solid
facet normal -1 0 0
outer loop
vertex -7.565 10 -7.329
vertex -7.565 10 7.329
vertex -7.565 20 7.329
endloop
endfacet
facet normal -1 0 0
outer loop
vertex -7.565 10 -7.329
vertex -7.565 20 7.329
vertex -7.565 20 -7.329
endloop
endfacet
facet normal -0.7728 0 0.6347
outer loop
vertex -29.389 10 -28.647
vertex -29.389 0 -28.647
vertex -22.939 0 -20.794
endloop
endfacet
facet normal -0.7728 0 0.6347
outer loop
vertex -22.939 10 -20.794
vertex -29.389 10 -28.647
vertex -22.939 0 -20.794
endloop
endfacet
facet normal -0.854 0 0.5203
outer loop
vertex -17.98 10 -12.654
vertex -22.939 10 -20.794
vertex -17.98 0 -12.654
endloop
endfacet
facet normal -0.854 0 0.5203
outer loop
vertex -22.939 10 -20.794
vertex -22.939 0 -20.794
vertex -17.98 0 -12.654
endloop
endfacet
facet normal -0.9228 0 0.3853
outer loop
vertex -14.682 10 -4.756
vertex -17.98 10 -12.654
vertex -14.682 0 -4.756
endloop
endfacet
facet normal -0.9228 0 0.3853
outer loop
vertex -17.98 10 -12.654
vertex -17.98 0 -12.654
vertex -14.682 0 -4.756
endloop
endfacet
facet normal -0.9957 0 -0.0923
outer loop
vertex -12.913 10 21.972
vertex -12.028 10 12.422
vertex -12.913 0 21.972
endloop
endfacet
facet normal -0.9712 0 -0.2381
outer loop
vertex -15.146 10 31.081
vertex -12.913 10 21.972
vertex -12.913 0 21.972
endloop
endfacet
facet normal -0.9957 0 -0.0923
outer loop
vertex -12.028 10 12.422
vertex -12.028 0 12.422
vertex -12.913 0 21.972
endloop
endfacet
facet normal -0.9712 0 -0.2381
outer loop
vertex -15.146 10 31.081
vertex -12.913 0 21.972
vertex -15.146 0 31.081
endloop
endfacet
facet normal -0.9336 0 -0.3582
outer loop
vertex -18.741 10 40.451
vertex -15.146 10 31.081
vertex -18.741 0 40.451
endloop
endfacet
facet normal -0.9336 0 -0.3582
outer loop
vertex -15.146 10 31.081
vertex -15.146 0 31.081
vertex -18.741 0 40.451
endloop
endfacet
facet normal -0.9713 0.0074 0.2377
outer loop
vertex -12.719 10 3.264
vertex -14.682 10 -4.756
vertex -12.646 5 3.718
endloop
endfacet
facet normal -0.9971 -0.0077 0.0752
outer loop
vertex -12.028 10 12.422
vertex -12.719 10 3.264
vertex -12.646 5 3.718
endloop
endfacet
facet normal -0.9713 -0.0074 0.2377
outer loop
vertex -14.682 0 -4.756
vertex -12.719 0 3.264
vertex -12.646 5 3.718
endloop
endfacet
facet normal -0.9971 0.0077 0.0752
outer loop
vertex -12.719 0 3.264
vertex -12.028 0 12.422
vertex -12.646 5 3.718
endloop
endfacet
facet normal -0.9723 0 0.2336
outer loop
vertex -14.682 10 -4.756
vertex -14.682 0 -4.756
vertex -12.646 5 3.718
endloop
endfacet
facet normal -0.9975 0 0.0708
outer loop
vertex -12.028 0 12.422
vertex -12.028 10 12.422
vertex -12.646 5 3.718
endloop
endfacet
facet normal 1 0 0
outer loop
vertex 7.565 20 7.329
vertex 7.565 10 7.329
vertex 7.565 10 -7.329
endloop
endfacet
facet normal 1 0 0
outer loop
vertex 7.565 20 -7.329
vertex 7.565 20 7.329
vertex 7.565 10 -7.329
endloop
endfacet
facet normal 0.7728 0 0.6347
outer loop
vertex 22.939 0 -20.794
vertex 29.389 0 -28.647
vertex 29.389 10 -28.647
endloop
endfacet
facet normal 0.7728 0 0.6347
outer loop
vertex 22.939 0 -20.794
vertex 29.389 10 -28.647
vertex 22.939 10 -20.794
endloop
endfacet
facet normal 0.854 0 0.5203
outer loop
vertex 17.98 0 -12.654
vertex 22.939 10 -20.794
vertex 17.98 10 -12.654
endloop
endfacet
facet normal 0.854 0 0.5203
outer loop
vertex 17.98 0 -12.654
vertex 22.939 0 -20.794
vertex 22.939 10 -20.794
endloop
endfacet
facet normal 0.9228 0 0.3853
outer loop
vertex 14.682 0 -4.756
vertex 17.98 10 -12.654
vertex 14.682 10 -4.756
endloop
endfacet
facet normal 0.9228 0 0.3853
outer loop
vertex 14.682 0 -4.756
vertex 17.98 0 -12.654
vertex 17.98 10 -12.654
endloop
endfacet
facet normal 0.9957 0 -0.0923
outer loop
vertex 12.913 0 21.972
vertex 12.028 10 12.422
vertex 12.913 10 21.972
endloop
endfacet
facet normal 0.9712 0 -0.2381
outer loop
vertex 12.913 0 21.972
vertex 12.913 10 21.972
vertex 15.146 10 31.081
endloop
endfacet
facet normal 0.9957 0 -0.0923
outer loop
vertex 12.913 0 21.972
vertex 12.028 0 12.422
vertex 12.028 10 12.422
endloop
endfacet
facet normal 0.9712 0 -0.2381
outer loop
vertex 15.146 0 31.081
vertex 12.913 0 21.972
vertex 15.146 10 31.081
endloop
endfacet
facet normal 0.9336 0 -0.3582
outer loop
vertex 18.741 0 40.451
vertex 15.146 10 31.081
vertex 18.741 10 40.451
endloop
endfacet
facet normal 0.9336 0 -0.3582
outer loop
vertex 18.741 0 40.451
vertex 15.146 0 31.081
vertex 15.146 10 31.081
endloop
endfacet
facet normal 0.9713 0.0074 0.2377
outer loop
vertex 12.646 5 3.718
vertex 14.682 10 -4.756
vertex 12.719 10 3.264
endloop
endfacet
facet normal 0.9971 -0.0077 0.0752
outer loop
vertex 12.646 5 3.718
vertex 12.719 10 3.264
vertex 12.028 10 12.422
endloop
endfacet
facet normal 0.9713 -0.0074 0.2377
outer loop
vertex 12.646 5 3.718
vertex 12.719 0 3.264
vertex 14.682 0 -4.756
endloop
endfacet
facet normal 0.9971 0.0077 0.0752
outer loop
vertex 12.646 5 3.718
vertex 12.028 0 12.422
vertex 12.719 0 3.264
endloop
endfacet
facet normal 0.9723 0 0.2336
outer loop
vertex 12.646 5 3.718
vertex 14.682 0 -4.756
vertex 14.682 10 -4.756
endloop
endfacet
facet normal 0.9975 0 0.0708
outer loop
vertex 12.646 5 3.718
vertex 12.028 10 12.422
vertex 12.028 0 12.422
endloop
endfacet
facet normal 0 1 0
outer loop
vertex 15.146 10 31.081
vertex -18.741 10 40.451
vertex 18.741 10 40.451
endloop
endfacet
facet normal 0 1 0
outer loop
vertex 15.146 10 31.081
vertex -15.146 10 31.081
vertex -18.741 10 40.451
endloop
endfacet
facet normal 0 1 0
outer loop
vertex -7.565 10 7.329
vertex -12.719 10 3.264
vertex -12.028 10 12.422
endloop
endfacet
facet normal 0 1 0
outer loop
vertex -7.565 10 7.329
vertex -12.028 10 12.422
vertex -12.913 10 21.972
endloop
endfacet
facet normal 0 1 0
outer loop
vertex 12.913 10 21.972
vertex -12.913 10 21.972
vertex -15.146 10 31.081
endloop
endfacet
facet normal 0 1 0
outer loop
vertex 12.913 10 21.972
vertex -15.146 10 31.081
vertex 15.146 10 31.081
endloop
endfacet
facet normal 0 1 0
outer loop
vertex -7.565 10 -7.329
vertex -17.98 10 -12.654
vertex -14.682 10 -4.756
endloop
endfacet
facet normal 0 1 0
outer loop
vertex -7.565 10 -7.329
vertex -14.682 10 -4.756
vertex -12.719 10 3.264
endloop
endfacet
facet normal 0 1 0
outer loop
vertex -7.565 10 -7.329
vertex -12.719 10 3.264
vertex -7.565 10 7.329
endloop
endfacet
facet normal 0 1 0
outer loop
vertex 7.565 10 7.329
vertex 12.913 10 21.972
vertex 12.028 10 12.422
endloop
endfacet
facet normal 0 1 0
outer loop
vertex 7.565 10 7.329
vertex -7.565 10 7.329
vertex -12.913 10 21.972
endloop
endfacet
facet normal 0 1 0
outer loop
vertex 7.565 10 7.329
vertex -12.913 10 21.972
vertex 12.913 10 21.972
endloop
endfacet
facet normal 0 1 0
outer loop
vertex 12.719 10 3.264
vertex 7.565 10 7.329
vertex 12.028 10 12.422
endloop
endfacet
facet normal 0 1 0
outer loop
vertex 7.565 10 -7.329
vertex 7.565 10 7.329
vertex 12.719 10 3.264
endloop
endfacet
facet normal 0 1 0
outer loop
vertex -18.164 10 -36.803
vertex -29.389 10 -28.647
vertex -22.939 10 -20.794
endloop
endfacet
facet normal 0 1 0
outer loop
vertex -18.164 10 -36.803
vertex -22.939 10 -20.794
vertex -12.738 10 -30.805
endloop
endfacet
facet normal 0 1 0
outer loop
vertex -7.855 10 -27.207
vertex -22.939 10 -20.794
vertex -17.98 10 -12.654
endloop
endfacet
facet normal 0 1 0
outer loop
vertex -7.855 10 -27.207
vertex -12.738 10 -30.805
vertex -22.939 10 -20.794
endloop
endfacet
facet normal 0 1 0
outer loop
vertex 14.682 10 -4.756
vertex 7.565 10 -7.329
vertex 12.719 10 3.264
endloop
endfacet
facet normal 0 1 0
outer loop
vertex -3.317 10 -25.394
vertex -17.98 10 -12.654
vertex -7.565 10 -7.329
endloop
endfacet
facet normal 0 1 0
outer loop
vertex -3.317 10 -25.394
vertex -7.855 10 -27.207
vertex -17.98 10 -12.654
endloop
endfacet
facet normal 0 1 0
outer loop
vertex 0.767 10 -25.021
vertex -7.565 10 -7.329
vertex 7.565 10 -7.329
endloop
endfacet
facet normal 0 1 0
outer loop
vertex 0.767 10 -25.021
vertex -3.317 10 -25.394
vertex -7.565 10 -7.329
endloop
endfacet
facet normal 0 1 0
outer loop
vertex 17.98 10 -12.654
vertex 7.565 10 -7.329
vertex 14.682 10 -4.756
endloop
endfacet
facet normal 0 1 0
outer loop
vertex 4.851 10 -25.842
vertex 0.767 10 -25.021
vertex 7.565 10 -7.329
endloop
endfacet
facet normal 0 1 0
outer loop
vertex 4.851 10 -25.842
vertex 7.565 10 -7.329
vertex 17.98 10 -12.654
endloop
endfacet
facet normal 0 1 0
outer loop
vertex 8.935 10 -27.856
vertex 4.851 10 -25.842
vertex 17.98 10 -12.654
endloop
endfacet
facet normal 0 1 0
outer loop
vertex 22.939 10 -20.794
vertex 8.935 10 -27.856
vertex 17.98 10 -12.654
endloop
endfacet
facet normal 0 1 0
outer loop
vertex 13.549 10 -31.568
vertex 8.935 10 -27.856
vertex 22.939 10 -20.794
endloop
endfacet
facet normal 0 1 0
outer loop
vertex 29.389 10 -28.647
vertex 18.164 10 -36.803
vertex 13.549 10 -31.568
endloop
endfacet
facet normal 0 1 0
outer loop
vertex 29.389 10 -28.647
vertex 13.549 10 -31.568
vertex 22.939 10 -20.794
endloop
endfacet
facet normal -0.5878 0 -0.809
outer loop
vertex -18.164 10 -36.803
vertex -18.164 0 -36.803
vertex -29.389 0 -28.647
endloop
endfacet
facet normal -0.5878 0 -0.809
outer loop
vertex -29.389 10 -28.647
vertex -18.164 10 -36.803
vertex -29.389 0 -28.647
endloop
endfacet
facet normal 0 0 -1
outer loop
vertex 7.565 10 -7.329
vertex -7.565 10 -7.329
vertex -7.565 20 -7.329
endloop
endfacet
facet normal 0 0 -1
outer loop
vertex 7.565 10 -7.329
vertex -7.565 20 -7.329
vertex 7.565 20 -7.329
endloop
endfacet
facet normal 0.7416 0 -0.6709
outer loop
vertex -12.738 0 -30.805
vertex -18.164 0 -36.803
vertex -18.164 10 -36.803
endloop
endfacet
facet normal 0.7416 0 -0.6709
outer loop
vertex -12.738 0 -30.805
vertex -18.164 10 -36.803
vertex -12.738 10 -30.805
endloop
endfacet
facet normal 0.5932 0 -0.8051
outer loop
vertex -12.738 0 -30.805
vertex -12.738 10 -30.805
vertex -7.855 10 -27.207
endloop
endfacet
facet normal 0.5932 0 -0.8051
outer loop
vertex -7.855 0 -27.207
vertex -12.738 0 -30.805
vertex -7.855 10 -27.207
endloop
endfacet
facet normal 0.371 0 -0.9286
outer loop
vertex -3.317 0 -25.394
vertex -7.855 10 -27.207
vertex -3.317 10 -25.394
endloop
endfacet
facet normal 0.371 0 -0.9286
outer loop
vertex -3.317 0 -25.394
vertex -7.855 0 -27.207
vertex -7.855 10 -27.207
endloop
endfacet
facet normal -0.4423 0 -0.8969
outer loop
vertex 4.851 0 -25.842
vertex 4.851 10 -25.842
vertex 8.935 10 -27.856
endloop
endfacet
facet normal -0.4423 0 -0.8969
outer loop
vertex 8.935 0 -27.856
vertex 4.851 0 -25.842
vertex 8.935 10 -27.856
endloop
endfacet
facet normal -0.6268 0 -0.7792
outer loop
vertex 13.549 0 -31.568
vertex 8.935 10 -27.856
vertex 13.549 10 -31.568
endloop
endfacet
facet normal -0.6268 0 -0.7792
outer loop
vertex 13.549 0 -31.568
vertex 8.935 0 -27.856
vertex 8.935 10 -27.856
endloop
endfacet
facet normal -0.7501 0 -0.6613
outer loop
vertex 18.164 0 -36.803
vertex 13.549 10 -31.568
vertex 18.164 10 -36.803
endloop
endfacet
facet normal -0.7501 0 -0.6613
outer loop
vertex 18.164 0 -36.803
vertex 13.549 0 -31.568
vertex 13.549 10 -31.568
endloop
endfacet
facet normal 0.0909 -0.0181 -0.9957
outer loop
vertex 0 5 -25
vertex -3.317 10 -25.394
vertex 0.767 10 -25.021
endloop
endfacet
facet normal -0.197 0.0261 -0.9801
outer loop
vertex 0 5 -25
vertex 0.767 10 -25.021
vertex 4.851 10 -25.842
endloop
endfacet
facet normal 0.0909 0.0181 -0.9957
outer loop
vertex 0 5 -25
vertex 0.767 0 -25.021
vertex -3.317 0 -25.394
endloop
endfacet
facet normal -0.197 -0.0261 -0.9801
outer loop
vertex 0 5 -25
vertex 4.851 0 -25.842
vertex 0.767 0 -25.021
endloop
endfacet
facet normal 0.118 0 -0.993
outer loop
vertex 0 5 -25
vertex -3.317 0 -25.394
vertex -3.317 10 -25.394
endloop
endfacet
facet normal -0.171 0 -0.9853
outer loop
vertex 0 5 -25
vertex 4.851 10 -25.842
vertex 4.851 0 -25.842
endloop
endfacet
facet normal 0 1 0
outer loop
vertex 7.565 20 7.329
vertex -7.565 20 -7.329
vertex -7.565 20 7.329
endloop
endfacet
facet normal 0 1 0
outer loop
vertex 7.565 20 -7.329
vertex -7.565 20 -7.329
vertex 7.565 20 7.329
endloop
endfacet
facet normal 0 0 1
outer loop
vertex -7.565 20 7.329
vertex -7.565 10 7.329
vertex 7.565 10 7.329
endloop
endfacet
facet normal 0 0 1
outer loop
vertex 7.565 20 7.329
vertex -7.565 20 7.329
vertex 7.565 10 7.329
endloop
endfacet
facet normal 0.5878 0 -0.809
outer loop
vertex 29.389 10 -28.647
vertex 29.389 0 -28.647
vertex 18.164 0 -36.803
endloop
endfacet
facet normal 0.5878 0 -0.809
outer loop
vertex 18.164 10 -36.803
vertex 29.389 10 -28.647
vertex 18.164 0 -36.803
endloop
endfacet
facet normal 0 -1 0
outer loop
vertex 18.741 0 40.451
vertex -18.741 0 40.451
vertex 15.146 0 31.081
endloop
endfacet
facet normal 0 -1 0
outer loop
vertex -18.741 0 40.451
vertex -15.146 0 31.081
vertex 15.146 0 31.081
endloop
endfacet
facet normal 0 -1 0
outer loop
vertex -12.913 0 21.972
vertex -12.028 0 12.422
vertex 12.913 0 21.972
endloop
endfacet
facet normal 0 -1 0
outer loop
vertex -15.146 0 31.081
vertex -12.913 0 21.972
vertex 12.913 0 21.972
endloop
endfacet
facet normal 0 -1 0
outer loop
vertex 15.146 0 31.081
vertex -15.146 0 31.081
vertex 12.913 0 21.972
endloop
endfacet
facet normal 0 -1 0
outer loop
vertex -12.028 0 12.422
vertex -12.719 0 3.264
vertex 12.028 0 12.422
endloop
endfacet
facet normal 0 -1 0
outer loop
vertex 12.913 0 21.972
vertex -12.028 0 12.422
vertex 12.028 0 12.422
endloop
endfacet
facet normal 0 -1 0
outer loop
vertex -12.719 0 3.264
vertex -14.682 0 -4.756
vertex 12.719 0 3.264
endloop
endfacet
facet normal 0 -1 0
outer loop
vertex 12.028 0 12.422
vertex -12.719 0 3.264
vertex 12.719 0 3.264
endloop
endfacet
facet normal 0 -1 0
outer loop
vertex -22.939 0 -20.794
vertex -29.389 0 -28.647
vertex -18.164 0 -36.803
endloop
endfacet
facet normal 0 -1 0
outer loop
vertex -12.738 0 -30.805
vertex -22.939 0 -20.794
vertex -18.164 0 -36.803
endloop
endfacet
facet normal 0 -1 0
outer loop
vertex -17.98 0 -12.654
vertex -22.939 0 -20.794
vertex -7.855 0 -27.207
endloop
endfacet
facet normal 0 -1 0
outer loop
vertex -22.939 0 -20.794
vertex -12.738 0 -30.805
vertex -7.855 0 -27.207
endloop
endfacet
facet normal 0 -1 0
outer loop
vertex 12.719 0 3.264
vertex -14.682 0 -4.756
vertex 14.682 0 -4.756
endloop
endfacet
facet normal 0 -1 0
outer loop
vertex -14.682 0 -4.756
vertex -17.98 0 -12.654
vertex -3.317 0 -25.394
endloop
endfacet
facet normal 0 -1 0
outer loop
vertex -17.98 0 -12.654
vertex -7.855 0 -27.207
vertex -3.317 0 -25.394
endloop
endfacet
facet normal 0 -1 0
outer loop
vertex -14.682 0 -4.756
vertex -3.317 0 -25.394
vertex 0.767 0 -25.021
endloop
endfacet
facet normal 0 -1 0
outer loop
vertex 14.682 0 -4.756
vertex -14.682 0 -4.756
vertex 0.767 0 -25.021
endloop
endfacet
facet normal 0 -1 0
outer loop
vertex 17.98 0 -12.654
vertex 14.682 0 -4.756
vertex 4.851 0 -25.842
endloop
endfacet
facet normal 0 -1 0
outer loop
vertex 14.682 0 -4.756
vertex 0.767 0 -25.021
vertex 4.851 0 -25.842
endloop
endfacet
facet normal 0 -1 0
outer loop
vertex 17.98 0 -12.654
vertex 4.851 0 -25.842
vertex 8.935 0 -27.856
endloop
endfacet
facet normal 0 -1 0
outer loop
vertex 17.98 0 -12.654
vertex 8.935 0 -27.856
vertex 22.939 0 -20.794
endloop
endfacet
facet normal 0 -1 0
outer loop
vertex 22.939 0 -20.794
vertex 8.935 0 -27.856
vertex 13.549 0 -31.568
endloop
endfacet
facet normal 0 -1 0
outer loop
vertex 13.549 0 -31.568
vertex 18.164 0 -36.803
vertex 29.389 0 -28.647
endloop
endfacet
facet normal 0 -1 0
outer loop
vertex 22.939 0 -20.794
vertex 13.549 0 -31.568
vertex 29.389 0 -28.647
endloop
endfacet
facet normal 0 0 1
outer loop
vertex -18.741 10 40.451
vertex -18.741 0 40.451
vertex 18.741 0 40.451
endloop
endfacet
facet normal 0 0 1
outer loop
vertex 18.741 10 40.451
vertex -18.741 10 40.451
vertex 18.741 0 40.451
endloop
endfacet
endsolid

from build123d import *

# Parameters (mm, degrees)
BOSS_EXTRUDE1_DEPTH = 10
SKETCH2_W           = 15.13057465
SKETCH2_H           = 14.657745542
BOSS_EXTRUDE4_DEPTH = 10


with BuildPart() as part:
    # Sketch1 → Boss-Extrude1 (new body)
    with BuildSketch(Plane(origin=(0, 0, 0), x_dir=(1, 0, 0), z_dir=(0, 1, 0))):
        with BuildLine():
            Line((-18.741064285, -40.450849719), (18.741064285, -40.450849719))
            add(Edge.make_bspline(
                [(29.389262615, 28.647450844), (1.227704009, -1.534586439), (18.741064285, -40.450849719)],
                knots=[0, 0, 0, 1, 1, 1], degree=2))
            Line((29.389262615, 28.647450844), (18.1635632, 36.803398875))
            add(Edge.make_bspline(
                [(-18.1635632, 36.803398875), (0, 13.196601125), (18.1635632, 36.803398875)],
                knots=[0, 0, 0, 1, 1, 1], degree=2))
            Line((-18.1635632, 36.803398875), (-29.389262615, 28.647450844))
            add(Edge.make_bspline(
                [(-29.389262615, 28.647450844), (-1.227704009, -1.534586439), (-18.741064285, -40.450849719)],
                knots=[0, 0, 0, 1, 1, 1], degree=2))
        make_face()
    extrude(amount=BOSS_EXTRUDE1_DEPTH)

    # Sketch2 → Boss-Extrude4 (add)
    with BuildSketch(Plane(origin=(0, 10, 0), x_dir=(1, 0, 0), z_dir=(0, 1, 0))):
        Rectangle(SKETCH2_W, SKETCH2_H)
    extrude(amount=BOSS_EXTRUDE4_DEPTH)


solid = part.part
